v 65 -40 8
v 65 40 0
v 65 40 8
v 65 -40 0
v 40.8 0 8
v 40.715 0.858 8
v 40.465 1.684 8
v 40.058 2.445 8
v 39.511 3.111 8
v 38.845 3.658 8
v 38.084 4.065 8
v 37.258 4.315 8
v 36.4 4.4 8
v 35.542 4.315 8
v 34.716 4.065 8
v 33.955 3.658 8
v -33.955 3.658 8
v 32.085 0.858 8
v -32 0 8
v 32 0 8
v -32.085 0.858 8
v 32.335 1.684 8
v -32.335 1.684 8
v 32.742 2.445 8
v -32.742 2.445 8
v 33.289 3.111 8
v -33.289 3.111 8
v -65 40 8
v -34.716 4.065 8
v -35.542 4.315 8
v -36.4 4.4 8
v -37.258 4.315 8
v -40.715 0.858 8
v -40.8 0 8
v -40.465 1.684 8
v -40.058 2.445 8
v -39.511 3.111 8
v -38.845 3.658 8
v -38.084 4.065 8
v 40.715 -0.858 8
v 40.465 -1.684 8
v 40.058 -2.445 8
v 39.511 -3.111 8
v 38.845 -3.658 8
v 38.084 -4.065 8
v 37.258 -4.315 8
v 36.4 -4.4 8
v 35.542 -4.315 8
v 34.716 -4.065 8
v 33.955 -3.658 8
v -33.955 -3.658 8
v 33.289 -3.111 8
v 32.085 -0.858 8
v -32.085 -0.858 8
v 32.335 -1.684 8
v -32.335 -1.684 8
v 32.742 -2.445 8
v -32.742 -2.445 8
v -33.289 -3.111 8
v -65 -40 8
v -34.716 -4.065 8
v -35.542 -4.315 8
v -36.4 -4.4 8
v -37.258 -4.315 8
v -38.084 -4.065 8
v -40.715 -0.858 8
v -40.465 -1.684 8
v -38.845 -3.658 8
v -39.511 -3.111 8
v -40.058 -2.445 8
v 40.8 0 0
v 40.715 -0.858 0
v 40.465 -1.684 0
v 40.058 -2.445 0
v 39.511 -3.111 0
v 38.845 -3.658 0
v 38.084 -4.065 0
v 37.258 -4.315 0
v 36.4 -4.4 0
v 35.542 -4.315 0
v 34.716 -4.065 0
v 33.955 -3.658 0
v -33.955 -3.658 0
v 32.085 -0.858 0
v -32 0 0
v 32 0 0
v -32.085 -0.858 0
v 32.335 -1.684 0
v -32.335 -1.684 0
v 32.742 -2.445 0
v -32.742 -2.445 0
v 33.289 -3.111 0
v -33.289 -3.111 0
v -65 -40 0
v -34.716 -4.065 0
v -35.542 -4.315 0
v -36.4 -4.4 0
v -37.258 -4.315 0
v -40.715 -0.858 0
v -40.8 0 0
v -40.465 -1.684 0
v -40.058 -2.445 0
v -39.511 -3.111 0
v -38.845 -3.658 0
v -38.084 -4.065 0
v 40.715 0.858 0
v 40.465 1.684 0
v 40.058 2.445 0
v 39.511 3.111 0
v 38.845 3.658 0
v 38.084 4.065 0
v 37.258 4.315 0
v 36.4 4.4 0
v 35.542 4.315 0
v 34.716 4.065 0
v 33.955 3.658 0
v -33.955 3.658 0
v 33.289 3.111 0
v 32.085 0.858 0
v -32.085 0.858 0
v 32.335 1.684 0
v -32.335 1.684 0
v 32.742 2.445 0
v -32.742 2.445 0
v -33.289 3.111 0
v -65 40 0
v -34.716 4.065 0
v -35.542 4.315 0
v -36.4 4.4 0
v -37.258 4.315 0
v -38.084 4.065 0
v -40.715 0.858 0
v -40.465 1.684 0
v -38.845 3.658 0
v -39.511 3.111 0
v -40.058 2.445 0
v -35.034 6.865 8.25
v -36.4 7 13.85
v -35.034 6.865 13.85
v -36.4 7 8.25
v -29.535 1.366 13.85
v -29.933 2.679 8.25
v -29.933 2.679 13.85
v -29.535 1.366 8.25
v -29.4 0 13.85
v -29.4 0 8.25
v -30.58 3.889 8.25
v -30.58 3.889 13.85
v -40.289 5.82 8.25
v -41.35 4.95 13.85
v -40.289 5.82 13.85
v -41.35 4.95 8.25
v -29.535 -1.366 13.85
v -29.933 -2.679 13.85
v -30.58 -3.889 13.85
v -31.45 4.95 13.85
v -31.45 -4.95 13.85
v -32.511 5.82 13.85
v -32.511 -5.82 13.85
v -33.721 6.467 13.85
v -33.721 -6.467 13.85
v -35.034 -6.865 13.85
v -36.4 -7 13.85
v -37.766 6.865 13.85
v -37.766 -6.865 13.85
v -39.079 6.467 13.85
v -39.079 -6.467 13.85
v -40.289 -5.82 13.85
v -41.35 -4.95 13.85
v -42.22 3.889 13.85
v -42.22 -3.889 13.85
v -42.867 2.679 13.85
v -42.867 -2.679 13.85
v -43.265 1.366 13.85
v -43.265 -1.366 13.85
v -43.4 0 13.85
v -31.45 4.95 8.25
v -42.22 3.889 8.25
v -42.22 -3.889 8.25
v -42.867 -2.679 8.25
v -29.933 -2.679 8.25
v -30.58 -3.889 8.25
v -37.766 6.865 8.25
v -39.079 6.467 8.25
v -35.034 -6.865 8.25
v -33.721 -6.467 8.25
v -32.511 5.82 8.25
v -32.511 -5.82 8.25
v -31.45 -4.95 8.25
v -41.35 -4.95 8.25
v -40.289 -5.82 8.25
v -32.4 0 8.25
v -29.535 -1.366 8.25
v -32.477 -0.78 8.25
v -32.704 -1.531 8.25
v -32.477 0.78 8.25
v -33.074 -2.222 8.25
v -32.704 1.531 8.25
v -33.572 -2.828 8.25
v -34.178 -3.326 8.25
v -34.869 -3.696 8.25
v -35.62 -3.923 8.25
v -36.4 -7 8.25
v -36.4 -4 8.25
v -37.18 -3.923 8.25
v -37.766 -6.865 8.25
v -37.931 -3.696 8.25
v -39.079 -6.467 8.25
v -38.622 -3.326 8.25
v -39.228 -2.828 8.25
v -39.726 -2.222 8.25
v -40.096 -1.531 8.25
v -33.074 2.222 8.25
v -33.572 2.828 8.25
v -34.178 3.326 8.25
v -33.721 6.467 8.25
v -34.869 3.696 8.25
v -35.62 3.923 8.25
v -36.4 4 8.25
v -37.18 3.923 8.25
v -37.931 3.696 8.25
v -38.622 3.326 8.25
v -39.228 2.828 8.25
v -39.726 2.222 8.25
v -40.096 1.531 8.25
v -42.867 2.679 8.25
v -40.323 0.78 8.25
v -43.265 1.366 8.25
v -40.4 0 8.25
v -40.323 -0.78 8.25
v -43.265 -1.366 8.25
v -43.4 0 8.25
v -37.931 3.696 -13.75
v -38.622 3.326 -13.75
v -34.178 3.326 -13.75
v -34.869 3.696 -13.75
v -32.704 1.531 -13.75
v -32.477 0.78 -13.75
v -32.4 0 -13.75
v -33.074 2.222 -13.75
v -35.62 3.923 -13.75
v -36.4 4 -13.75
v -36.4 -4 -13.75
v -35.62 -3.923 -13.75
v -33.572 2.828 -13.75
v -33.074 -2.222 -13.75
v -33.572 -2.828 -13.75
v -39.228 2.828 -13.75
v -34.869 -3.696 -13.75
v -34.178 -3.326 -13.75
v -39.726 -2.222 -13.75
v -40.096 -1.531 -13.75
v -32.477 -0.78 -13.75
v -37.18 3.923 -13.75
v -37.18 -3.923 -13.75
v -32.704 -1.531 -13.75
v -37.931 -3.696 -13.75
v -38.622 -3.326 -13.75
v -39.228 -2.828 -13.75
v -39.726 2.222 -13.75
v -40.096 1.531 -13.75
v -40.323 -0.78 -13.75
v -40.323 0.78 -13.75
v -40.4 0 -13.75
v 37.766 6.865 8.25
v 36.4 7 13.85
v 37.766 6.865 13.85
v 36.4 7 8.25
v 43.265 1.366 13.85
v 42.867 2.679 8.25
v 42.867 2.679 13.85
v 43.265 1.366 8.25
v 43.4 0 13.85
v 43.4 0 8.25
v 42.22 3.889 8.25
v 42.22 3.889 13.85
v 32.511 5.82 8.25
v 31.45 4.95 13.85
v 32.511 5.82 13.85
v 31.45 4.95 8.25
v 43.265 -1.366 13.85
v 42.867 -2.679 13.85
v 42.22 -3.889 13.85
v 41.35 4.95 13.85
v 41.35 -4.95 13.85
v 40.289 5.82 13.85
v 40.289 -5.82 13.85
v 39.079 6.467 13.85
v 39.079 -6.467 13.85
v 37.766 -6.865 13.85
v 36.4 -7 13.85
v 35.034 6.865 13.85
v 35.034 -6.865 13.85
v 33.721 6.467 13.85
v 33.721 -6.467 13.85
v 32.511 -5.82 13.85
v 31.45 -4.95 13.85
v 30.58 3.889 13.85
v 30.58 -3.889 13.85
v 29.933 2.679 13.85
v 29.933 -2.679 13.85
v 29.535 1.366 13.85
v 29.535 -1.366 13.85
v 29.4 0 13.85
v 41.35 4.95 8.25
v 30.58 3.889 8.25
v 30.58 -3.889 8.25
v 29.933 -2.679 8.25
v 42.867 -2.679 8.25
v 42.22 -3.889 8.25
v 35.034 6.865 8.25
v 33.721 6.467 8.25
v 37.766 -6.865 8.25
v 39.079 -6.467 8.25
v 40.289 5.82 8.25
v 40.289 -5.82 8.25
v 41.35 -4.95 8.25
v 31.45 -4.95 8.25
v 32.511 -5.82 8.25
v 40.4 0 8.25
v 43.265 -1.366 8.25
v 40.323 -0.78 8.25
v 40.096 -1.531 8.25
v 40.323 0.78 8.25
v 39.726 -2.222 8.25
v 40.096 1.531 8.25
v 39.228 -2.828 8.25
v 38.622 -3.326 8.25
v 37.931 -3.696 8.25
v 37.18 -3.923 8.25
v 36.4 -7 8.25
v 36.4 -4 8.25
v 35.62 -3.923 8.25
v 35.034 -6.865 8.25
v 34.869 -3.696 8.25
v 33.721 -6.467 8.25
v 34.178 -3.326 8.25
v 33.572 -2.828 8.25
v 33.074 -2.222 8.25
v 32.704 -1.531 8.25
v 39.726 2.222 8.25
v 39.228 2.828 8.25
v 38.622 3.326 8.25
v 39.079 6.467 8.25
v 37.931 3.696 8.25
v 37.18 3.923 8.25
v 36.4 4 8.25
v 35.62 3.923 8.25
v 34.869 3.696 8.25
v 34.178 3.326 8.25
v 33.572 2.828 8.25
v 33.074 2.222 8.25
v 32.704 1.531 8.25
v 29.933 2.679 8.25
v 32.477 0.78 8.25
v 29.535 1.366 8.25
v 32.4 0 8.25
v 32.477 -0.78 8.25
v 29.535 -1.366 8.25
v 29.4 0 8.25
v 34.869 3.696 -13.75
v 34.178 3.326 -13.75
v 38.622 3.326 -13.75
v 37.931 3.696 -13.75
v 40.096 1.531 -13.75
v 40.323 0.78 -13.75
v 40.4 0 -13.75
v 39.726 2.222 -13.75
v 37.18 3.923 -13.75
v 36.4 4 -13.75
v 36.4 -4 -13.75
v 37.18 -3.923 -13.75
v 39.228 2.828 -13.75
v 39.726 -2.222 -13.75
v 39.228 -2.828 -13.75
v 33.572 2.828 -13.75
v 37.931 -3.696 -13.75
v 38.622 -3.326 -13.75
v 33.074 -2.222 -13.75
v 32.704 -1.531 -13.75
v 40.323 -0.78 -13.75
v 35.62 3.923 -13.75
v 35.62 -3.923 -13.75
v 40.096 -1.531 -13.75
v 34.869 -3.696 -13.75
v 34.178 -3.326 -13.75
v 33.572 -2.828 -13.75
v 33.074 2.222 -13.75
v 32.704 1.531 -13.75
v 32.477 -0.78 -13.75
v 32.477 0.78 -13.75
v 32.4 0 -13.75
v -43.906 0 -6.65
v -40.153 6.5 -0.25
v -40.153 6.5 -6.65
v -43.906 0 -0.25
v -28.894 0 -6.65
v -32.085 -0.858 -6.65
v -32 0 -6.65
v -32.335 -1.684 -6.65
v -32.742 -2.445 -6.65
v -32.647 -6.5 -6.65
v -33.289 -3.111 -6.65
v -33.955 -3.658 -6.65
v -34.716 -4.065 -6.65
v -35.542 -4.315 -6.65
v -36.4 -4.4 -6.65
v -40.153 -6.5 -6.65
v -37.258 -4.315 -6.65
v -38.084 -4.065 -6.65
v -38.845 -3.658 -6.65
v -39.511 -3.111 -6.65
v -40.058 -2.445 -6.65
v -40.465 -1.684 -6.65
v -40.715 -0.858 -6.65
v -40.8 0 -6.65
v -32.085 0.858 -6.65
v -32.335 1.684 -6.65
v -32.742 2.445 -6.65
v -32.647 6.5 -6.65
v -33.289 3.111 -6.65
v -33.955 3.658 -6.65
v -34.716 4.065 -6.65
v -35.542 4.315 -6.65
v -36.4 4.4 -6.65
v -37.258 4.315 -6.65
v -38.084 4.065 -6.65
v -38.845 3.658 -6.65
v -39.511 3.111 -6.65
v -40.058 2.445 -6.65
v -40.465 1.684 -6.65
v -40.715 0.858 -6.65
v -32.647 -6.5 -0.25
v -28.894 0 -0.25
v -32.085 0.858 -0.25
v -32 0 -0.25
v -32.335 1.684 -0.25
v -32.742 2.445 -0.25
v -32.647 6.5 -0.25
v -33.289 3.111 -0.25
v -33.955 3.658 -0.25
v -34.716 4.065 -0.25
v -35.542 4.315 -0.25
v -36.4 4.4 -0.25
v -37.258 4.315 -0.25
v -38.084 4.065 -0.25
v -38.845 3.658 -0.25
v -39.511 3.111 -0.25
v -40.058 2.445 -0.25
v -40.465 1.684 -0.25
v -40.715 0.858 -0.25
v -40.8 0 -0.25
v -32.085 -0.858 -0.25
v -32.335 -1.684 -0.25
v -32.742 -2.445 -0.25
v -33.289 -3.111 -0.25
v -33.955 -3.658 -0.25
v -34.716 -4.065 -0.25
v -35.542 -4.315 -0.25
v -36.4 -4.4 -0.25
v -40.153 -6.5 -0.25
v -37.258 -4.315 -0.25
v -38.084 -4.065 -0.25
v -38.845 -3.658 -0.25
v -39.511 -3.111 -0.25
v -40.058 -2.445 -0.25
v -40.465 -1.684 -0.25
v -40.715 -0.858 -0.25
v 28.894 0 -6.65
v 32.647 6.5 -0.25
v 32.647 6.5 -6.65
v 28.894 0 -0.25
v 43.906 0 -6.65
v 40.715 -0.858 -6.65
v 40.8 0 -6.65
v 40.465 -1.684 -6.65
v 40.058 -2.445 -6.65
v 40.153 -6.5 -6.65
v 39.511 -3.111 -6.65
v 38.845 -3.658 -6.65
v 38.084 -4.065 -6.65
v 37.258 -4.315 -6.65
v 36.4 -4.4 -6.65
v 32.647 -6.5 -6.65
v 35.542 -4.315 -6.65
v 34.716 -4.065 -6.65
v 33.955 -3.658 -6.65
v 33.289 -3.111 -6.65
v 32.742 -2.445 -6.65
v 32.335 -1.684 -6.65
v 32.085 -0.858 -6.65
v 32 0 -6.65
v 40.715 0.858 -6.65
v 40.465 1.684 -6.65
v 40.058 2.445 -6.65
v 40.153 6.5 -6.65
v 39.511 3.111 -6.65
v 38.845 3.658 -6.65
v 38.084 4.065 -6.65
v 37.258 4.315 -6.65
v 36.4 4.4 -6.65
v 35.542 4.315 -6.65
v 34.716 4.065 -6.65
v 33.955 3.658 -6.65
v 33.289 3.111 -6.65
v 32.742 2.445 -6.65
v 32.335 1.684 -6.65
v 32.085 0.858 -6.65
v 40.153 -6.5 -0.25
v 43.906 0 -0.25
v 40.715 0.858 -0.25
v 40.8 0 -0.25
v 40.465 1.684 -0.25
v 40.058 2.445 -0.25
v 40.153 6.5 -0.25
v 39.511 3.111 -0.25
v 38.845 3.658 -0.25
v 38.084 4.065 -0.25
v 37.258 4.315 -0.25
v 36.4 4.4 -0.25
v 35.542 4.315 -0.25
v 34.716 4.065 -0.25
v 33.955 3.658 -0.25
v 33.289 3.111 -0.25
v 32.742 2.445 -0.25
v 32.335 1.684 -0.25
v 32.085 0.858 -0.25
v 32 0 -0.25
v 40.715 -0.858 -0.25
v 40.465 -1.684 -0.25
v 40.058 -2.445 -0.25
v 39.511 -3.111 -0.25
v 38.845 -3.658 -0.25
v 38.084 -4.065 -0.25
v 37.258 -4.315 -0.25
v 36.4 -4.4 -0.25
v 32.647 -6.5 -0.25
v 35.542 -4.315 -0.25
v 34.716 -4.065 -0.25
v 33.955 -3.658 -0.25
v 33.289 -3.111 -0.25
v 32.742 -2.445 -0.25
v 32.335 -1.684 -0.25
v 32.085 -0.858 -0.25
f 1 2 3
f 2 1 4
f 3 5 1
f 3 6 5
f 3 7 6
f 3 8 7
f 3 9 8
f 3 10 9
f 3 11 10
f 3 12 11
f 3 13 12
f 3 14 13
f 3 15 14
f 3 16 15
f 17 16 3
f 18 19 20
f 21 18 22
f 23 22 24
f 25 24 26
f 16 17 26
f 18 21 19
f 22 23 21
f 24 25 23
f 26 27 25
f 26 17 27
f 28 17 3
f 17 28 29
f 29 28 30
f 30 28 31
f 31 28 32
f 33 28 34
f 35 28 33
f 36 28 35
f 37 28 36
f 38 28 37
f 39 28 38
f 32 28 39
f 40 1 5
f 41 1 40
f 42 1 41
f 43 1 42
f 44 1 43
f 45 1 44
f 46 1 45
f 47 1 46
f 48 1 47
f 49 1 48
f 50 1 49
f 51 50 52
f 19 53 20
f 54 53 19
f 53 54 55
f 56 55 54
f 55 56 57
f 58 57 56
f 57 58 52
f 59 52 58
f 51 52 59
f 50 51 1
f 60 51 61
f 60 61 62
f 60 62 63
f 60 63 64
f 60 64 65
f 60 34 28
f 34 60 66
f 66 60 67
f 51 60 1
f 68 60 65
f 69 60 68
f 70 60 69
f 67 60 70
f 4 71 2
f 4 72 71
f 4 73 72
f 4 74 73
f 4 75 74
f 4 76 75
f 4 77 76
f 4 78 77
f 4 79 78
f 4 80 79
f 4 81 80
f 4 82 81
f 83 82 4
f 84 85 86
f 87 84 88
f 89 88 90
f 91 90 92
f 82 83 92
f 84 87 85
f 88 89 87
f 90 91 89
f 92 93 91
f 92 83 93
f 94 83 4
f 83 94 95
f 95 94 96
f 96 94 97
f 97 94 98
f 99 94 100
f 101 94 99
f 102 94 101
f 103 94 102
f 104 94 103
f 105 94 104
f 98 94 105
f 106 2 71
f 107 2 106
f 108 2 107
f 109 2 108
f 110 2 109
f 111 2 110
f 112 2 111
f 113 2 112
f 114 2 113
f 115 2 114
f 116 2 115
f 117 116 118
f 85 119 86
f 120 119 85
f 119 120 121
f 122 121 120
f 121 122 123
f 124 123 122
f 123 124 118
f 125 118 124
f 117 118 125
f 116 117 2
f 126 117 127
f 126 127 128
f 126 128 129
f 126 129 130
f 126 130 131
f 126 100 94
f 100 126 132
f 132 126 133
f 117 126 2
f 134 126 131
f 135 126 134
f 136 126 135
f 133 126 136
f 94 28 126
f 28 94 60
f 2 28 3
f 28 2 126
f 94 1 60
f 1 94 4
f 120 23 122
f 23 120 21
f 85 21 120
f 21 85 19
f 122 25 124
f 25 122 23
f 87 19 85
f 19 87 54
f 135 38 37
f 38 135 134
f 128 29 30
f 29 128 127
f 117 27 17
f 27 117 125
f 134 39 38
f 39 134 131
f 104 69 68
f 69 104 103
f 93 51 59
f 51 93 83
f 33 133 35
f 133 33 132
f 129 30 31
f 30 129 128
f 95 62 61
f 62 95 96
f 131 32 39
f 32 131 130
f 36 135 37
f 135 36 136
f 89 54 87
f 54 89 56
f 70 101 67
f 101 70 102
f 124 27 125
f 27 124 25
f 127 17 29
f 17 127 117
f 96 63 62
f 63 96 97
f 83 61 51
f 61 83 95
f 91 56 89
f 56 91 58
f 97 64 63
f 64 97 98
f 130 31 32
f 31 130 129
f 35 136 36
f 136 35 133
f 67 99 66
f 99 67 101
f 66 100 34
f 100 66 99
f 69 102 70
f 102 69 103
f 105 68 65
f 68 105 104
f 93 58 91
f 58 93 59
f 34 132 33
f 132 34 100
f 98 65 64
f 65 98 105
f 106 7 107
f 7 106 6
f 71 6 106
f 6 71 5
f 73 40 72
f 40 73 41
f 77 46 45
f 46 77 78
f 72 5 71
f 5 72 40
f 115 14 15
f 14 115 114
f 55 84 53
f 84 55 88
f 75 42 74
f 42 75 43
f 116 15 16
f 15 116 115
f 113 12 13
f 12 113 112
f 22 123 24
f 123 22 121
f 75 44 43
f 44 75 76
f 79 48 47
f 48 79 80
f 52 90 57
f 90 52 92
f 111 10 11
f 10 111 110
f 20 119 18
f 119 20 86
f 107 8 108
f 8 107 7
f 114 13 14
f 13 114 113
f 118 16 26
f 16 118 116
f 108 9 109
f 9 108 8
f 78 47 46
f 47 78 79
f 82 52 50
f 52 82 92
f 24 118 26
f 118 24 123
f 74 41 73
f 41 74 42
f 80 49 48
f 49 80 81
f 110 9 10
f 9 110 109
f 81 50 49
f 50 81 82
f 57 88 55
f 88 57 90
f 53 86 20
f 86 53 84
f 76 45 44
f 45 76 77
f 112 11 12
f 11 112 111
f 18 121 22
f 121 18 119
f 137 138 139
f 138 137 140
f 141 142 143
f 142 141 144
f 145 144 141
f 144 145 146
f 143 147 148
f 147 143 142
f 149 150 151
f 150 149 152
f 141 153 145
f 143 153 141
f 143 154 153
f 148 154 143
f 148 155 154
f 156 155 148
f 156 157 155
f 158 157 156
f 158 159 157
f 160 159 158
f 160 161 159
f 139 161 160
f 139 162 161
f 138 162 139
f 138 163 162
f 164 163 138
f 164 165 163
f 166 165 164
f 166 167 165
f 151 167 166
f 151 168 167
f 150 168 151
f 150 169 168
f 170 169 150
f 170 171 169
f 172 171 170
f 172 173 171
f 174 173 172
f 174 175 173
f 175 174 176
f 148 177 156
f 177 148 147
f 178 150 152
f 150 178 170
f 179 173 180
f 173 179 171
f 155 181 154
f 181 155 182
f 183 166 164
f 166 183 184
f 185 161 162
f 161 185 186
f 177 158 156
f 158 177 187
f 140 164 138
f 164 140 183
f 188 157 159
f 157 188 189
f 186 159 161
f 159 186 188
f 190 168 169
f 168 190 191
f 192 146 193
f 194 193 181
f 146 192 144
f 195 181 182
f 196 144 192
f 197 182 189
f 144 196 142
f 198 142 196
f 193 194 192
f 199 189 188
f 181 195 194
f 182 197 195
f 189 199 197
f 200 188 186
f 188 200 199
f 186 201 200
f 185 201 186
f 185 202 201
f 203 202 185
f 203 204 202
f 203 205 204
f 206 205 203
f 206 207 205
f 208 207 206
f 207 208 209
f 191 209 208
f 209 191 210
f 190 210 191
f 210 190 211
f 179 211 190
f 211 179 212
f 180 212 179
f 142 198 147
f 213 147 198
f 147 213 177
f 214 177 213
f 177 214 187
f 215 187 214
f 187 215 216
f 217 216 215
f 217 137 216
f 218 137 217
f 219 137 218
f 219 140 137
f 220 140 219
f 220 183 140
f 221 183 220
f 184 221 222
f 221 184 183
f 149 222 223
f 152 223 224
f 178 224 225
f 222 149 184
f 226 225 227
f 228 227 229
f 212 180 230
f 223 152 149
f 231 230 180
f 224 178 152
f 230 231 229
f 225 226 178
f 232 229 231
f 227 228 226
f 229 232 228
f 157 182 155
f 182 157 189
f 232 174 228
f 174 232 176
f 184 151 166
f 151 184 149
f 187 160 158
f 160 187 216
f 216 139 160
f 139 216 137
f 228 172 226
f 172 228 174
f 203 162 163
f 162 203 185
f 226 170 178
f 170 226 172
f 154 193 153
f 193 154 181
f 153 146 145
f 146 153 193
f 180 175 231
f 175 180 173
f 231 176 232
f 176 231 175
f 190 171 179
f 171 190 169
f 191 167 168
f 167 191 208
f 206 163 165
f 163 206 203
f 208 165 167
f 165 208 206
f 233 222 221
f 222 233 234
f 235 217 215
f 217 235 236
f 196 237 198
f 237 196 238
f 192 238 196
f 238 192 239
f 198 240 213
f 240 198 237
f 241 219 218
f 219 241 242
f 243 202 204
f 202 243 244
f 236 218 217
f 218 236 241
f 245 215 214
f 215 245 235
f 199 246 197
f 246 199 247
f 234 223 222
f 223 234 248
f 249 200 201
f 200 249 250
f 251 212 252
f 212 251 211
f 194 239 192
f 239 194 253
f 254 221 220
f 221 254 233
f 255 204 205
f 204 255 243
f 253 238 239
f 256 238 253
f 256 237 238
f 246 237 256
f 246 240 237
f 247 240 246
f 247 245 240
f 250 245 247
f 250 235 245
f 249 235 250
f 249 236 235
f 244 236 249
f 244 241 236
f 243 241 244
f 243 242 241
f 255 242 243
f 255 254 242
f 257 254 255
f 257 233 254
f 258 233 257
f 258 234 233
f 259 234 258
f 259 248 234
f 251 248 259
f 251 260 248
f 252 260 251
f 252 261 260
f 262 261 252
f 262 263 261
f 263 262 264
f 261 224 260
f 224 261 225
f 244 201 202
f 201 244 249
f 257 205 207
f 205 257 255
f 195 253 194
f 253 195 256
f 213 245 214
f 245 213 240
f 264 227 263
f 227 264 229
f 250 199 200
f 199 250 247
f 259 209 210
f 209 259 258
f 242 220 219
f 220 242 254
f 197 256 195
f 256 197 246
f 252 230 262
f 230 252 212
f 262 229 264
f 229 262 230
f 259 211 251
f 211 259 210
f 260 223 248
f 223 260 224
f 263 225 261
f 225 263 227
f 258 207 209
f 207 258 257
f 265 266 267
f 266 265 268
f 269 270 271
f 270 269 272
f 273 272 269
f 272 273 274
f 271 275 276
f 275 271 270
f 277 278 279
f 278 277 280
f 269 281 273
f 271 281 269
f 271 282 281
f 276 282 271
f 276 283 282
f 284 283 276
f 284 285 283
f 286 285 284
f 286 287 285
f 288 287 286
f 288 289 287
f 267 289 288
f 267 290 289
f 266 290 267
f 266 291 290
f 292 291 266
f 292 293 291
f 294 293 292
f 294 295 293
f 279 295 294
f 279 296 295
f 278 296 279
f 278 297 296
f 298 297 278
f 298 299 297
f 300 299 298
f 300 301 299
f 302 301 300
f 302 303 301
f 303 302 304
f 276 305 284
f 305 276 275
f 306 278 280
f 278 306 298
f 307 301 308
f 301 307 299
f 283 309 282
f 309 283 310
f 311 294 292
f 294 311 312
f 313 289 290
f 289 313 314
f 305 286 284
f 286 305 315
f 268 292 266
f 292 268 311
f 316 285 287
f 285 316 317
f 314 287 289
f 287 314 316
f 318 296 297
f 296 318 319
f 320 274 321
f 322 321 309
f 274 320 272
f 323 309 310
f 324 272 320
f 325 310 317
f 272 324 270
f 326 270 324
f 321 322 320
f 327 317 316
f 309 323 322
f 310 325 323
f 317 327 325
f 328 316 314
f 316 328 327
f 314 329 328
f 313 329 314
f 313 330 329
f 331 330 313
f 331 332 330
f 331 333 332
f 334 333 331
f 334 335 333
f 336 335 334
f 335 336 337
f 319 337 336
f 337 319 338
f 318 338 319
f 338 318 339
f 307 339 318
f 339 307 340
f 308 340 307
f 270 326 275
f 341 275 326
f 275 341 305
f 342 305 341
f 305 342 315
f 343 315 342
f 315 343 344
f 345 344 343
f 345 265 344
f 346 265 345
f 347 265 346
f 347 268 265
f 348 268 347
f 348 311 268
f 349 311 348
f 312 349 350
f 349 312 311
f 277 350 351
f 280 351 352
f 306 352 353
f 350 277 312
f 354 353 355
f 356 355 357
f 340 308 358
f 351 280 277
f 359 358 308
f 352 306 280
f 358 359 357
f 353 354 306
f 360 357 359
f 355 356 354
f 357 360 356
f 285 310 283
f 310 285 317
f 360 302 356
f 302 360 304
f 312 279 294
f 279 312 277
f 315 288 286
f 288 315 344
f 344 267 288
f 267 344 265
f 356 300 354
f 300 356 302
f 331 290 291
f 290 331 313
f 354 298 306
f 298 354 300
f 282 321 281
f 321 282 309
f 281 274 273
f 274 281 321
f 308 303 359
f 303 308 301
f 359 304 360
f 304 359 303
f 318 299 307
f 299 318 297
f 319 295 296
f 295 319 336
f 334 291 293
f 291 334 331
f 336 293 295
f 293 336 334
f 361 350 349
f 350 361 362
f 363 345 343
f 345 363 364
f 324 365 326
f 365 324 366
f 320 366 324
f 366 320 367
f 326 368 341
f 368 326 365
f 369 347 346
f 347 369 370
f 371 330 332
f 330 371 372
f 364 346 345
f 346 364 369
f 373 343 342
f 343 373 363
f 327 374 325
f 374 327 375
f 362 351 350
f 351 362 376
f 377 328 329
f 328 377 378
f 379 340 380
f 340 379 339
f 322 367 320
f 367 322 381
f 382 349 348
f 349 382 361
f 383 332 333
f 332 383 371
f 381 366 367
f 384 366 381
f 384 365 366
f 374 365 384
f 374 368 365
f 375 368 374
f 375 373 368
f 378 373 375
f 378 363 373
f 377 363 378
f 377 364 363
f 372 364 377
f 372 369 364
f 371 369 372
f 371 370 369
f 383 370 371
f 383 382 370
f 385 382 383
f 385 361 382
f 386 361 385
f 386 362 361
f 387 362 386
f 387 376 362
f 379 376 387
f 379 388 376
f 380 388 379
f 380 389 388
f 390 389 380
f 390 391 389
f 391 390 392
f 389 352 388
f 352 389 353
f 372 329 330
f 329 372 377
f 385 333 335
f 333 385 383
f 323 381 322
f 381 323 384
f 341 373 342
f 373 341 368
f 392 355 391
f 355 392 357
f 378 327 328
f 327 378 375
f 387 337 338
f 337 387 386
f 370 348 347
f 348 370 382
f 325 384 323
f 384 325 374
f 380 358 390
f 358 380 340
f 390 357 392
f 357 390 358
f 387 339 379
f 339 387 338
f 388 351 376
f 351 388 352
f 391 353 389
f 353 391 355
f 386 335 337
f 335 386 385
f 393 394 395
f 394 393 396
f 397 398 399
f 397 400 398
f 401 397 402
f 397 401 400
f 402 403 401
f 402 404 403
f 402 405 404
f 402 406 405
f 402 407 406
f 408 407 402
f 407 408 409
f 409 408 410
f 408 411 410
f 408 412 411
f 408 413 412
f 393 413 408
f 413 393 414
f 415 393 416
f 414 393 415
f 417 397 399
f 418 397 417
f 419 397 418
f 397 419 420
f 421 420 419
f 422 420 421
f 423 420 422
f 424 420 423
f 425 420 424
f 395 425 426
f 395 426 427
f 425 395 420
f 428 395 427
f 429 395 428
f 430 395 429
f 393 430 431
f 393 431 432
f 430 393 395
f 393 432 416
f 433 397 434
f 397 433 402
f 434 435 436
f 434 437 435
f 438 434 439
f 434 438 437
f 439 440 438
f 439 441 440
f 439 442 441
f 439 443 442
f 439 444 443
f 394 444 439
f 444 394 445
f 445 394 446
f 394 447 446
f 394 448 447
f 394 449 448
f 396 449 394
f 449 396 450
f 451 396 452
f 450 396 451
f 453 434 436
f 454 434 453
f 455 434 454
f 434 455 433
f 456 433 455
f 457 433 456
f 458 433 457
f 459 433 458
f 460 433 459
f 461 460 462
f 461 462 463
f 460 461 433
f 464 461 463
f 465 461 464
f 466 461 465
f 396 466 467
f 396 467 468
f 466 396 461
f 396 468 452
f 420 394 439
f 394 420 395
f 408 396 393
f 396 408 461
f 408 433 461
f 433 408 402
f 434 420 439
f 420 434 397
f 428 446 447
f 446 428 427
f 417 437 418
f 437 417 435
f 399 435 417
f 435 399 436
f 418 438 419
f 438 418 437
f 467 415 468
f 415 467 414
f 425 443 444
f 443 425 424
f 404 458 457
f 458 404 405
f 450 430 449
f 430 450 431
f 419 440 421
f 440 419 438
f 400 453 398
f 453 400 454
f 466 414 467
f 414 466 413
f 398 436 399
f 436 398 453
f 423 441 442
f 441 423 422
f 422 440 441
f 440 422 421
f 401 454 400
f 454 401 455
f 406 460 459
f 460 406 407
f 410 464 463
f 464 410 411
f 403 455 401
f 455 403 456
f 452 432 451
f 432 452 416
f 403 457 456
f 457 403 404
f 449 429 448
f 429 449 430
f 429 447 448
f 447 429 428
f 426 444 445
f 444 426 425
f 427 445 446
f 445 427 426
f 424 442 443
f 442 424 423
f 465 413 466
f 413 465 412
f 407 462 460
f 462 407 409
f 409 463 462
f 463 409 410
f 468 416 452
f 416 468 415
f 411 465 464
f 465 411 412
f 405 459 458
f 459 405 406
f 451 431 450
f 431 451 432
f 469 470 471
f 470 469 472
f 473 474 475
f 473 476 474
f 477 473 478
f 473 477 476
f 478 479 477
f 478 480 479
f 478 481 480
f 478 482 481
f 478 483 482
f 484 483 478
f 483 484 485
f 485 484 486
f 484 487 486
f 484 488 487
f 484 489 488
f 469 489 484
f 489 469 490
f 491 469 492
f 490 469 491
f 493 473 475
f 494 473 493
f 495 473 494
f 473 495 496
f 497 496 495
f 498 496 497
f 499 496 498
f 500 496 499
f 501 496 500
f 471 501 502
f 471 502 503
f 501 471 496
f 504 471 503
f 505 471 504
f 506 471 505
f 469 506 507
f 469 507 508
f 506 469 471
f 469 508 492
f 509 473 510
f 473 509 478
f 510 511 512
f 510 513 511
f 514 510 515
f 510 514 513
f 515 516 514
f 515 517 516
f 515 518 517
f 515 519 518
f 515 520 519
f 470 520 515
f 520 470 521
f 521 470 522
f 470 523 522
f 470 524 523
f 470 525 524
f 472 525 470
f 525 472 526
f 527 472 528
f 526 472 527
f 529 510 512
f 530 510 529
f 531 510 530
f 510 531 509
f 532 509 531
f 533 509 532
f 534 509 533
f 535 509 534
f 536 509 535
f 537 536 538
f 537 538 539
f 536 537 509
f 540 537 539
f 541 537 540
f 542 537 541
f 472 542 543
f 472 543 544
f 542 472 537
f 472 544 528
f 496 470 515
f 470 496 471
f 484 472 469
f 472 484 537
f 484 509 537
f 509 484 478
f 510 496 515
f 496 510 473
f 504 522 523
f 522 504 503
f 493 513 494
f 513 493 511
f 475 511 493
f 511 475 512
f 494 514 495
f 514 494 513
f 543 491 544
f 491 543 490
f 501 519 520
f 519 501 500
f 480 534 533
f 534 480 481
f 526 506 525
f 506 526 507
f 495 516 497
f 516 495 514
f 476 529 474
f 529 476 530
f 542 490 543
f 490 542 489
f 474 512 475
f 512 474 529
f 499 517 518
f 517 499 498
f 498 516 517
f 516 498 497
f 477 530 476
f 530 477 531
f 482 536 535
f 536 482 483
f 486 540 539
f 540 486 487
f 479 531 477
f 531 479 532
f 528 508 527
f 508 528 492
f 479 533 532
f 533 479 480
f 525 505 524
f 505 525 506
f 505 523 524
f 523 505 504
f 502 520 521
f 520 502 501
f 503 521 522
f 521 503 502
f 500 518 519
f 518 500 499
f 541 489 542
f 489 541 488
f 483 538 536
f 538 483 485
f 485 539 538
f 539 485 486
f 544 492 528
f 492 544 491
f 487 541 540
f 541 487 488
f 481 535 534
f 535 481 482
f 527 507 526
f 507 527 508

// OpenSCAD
$fn = 32;

// ------------------------------------------------------------------------
// Bolted plate: 130 x 80 x 8 mm plate, 2 fasteners
// Every part is its own module, assembly() places them once.
// ------------------------------------------------------------------------

// --- part 1 ---
module plate() {
  difference() {
    translate([-65, -40, 0]) cube([130, 80, 8]);
    translate([-36.4, 0, -1]) cylinder(h = 10, d = 8.8);
    translate([36.4, 0, -1]) cylinder(h = 10, d = 8.8);
  }
}

// --- part 2 ---
module bolt1() {
  cylinder(h = 5.6, d = 14);
  translate([0, 0, -22]) cylinder(h = 22, d = 8);
}

// --- part 3 ---
module bolt2() {
  cylinder(h = 5.6, d = 14);
  translate([0, 0, -22]) cylinder(h = 22, d = 8);
}

// --- part 4 ---
module nut1() {
  difference() {
    linear_extrude(height = 6.4) polygon(points = [[7.506, 0], [3.753, 6.5], [-3.753, 6.5], [-7.506, 0], [-3.753, -6.5], [3.753, -6.5]]);
    translate([0, 0, -1]) cylinder(h = 8.4, d = 8.8);
  }
}

// --- part 5 ---
module nut2() {
  difference() {
    linear_extrude(height = 6.4) polygon(points = [[7.506, 0], [3.753, 6.5], [-3.753, 6.5], [-7.506, 0], [-3.753, -6.5], [3.753, -6.5]]);
    translate([0, 0, -1]) cylinder(h = 8.4, d = 8.8);
  }
}

// --- assembly ---
module assembly() {
  translate([0, 0, 0]) rotate([0, 0, 0]) plate();
  translate([-36.4, 0, 8.25]) rotate([0, 0, 0]) bolt1();
  translate([36.4, 0, 8.25]) rotate([0, 0, 0]) bolt2();
  translate([-36.4, 0, -6.65]) rotate([0, 0, 0]) nut1();
  translate([36.4, 0, -6.65]) rotate([0, 0, 0]) nut2();
}

assembly();
